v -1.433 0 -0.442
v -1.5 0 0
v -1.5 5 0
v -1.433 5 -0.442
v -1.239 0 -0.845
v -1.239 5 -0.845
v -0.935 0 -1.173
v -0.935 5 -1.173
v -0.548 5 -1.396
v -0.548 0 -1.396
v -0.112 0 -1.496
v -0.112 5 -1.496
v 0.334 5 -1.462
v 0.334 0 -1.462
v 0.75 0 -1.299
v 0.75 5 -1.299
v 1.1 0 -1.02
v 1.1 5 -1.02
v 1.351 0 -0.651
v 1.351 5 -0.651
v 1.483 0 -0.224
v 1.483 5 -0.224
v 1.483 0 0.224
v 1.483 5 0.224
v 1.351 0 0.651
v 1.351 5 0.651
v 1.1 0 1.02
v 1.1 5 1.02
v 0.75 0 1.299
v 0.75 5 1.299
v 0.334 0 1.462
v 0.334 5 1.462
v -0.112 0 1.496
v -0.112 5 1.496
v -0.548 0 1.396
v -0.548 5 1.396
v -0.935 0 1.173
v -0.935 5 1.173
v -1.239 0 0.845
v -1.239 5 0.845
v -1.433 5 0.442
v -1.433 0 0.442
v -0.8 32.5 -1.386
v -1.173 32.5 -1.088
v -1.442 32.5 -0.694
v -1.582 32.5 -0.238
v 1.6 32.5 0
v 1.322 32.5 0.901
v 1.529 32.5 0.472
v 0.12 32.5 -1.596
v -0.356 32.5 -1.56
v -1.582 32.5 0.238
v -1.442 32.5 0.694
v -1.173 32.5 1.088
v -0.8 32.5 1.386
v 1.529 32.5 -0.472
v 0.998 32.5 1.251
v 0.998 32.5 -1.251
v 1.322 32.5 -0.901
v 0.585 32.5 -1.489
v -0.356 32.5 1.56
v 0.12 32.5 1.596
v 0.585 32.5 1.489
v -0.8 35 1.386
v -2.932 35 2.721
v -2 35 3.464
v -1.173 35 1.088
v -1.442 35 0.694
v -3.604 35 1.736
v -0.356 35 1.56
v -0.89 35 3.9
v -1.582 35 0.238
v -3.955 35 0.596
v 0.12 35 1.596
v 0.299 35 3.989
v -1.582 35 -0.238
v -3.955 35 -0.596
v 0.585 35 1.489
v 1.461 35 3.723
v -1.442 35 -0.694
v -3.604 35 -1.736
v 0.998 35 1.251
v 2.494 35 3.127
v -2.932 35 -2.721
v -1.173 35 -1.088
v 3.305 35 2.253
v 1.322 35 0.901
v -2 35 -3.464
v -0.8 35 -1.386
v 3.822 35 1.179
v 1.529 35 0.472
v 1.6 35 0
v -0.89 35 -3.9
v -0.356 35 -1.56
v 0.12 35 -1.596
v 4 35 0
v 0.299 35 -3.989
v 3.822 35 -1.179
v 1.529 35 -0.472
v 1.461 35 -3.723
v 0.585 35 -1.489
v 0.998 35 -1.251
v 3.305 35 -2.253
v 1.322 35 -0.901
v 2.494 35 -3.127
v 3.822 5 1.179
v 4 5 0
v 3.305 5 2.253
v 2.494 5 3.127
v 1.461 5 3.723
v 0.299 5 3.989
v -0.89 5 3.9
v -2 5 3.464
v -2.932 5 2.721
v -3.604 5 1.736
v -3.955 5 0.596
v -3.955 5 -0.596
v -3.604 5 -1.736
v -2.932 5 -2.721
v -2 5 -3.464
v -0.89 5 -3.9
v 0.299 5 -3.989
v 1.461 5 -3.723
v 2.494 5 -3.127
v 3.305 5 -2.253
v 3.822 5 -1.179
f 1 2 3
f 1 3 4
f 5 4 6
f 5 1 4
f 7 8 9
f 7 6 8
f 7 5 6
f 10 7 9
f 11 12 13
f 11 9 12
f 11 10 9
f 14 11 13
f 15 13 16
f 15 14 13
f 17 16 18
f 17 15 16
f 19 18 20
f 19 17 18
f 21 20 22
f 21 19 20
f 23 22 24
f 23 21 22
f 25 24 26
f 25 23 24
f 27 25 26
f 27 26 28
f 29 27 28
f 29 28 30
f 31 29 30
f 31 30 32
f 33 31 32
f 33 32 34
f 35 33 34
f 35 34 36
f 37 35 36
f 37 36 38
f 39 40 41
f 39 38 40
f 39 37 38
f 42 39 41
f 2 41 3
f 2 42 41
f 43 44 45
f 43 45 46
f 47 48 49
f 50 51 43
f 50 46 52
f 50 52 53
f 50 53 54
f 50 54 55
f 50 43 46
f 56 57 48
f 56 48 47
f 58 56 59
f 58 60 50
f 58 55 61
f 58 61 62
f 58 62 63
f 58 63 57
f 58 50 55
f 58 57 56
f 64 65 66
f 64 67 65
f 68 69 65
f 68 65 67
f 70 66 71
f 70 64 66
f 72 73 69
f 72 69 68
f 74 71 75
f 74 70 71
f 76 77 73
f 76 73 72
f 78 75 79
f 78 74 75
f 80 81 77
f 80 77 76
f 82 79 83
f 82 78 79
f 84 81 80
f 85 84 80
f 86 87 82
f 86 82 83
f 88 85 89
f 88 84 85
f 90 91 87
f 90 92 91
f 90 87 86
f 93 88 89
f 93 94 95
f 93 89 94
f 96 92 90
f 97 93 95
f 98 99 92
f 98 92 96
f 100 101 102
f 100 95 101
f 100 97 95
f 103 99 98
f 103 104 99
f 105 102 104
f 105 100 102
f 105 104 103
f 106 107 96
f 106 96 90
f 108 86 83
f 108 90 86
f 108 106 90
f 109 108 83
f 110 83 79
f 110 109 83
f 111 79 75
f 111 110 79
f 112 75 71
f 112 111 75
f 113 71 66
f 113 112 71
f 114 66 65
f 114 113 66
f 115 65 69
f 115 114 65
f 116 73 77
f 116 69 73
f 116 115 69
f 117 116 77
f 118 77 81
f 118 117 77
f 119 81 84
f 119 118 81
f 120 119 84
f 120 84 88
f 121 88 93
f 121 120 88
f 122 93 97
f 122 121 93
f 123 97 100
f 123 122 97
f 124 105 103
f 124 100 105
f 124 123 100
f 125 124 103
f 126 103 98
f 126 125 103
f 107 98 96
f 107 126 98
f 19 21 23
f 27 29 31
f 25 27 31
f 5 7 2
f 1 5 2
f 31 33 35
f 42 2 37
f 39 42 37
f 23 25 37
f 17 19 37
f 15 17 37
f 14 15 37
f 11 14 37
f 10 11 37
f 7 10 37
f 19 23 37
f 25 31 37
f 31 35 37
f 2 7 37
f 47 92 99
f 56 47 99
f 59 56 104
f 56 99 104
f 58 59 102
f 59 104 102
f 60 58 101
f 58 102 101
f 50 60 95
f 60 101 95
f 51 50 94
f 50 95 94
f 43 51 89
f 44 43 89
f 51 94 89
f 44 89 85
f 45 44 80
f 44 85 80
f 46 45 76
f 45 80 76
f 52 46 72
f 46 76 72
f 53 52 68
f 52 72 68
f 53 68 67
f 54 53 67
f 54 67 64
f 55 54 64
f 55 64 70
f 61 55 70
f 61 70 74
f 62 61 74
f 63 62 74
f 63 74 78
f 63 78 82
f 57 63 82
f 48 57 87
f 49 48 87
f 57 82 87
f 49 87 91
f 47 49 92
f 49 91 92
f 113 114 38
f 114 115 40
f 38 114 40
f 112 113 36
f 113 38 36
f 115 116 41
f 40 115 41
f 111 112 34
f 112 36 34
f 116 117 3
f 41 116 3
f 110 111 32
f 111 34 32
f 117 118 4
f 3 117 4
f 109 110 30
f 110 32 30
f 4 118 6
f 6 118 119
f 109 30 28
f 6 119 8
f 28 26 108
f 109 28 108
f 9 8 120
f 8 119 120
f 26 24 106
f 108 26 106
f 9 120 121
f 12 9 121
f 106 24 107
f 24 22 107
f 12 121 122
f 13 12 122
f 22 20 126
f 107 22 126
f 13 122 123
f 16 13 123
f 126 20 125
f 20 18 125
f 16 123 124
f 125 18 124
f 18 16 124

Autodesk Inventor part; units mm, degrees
ref_plane "YZ Plane" through (0, 0, 0) normal (1, 0, 0) x (0, 1, 0)
ref_plane "XZ Plane" through (0, 0, 0) normal (0, 1, 0) x (-1, 0, 0)
ref_plane "XY Plane" through (0, 0, 0) normal (0, 0, 1) x (1, 0, 0)
sketch "Sketch1" plane through (0, 0, 0) normal (0, 1, 0) x (-1, 0, 0)
  circle A0 centre (0, 0) radius 1.5
  dimension "d0" = 3
extrude "Extrusion1" add sketch "Sketch1" along normal blind 5
sketch "Sketch2" plane through (0, 5, 0) normal (0, 1, 0) x (1, 0, 0)
  circle A0 centre (0, 0) radius 4
  dimension "d3" = 8
extrude "Extrusion2" add sketch "Sketch2" along normal blind 30
sketch "Sketch3" plane through (0, 35, 0) normal (0, 1, 0) x (1, 0, 0)
  circle A0 centre (0, 0) radius 1.5 projected
  circle A1 centre (0, 0) radius 1.6
  dimension "d6" = 3.2
extrude "Extrusion3" cut sketch "Sketch3" against normal blind 2.5 contours A0 | A1
properties part number "ControlPanel_longStands"
